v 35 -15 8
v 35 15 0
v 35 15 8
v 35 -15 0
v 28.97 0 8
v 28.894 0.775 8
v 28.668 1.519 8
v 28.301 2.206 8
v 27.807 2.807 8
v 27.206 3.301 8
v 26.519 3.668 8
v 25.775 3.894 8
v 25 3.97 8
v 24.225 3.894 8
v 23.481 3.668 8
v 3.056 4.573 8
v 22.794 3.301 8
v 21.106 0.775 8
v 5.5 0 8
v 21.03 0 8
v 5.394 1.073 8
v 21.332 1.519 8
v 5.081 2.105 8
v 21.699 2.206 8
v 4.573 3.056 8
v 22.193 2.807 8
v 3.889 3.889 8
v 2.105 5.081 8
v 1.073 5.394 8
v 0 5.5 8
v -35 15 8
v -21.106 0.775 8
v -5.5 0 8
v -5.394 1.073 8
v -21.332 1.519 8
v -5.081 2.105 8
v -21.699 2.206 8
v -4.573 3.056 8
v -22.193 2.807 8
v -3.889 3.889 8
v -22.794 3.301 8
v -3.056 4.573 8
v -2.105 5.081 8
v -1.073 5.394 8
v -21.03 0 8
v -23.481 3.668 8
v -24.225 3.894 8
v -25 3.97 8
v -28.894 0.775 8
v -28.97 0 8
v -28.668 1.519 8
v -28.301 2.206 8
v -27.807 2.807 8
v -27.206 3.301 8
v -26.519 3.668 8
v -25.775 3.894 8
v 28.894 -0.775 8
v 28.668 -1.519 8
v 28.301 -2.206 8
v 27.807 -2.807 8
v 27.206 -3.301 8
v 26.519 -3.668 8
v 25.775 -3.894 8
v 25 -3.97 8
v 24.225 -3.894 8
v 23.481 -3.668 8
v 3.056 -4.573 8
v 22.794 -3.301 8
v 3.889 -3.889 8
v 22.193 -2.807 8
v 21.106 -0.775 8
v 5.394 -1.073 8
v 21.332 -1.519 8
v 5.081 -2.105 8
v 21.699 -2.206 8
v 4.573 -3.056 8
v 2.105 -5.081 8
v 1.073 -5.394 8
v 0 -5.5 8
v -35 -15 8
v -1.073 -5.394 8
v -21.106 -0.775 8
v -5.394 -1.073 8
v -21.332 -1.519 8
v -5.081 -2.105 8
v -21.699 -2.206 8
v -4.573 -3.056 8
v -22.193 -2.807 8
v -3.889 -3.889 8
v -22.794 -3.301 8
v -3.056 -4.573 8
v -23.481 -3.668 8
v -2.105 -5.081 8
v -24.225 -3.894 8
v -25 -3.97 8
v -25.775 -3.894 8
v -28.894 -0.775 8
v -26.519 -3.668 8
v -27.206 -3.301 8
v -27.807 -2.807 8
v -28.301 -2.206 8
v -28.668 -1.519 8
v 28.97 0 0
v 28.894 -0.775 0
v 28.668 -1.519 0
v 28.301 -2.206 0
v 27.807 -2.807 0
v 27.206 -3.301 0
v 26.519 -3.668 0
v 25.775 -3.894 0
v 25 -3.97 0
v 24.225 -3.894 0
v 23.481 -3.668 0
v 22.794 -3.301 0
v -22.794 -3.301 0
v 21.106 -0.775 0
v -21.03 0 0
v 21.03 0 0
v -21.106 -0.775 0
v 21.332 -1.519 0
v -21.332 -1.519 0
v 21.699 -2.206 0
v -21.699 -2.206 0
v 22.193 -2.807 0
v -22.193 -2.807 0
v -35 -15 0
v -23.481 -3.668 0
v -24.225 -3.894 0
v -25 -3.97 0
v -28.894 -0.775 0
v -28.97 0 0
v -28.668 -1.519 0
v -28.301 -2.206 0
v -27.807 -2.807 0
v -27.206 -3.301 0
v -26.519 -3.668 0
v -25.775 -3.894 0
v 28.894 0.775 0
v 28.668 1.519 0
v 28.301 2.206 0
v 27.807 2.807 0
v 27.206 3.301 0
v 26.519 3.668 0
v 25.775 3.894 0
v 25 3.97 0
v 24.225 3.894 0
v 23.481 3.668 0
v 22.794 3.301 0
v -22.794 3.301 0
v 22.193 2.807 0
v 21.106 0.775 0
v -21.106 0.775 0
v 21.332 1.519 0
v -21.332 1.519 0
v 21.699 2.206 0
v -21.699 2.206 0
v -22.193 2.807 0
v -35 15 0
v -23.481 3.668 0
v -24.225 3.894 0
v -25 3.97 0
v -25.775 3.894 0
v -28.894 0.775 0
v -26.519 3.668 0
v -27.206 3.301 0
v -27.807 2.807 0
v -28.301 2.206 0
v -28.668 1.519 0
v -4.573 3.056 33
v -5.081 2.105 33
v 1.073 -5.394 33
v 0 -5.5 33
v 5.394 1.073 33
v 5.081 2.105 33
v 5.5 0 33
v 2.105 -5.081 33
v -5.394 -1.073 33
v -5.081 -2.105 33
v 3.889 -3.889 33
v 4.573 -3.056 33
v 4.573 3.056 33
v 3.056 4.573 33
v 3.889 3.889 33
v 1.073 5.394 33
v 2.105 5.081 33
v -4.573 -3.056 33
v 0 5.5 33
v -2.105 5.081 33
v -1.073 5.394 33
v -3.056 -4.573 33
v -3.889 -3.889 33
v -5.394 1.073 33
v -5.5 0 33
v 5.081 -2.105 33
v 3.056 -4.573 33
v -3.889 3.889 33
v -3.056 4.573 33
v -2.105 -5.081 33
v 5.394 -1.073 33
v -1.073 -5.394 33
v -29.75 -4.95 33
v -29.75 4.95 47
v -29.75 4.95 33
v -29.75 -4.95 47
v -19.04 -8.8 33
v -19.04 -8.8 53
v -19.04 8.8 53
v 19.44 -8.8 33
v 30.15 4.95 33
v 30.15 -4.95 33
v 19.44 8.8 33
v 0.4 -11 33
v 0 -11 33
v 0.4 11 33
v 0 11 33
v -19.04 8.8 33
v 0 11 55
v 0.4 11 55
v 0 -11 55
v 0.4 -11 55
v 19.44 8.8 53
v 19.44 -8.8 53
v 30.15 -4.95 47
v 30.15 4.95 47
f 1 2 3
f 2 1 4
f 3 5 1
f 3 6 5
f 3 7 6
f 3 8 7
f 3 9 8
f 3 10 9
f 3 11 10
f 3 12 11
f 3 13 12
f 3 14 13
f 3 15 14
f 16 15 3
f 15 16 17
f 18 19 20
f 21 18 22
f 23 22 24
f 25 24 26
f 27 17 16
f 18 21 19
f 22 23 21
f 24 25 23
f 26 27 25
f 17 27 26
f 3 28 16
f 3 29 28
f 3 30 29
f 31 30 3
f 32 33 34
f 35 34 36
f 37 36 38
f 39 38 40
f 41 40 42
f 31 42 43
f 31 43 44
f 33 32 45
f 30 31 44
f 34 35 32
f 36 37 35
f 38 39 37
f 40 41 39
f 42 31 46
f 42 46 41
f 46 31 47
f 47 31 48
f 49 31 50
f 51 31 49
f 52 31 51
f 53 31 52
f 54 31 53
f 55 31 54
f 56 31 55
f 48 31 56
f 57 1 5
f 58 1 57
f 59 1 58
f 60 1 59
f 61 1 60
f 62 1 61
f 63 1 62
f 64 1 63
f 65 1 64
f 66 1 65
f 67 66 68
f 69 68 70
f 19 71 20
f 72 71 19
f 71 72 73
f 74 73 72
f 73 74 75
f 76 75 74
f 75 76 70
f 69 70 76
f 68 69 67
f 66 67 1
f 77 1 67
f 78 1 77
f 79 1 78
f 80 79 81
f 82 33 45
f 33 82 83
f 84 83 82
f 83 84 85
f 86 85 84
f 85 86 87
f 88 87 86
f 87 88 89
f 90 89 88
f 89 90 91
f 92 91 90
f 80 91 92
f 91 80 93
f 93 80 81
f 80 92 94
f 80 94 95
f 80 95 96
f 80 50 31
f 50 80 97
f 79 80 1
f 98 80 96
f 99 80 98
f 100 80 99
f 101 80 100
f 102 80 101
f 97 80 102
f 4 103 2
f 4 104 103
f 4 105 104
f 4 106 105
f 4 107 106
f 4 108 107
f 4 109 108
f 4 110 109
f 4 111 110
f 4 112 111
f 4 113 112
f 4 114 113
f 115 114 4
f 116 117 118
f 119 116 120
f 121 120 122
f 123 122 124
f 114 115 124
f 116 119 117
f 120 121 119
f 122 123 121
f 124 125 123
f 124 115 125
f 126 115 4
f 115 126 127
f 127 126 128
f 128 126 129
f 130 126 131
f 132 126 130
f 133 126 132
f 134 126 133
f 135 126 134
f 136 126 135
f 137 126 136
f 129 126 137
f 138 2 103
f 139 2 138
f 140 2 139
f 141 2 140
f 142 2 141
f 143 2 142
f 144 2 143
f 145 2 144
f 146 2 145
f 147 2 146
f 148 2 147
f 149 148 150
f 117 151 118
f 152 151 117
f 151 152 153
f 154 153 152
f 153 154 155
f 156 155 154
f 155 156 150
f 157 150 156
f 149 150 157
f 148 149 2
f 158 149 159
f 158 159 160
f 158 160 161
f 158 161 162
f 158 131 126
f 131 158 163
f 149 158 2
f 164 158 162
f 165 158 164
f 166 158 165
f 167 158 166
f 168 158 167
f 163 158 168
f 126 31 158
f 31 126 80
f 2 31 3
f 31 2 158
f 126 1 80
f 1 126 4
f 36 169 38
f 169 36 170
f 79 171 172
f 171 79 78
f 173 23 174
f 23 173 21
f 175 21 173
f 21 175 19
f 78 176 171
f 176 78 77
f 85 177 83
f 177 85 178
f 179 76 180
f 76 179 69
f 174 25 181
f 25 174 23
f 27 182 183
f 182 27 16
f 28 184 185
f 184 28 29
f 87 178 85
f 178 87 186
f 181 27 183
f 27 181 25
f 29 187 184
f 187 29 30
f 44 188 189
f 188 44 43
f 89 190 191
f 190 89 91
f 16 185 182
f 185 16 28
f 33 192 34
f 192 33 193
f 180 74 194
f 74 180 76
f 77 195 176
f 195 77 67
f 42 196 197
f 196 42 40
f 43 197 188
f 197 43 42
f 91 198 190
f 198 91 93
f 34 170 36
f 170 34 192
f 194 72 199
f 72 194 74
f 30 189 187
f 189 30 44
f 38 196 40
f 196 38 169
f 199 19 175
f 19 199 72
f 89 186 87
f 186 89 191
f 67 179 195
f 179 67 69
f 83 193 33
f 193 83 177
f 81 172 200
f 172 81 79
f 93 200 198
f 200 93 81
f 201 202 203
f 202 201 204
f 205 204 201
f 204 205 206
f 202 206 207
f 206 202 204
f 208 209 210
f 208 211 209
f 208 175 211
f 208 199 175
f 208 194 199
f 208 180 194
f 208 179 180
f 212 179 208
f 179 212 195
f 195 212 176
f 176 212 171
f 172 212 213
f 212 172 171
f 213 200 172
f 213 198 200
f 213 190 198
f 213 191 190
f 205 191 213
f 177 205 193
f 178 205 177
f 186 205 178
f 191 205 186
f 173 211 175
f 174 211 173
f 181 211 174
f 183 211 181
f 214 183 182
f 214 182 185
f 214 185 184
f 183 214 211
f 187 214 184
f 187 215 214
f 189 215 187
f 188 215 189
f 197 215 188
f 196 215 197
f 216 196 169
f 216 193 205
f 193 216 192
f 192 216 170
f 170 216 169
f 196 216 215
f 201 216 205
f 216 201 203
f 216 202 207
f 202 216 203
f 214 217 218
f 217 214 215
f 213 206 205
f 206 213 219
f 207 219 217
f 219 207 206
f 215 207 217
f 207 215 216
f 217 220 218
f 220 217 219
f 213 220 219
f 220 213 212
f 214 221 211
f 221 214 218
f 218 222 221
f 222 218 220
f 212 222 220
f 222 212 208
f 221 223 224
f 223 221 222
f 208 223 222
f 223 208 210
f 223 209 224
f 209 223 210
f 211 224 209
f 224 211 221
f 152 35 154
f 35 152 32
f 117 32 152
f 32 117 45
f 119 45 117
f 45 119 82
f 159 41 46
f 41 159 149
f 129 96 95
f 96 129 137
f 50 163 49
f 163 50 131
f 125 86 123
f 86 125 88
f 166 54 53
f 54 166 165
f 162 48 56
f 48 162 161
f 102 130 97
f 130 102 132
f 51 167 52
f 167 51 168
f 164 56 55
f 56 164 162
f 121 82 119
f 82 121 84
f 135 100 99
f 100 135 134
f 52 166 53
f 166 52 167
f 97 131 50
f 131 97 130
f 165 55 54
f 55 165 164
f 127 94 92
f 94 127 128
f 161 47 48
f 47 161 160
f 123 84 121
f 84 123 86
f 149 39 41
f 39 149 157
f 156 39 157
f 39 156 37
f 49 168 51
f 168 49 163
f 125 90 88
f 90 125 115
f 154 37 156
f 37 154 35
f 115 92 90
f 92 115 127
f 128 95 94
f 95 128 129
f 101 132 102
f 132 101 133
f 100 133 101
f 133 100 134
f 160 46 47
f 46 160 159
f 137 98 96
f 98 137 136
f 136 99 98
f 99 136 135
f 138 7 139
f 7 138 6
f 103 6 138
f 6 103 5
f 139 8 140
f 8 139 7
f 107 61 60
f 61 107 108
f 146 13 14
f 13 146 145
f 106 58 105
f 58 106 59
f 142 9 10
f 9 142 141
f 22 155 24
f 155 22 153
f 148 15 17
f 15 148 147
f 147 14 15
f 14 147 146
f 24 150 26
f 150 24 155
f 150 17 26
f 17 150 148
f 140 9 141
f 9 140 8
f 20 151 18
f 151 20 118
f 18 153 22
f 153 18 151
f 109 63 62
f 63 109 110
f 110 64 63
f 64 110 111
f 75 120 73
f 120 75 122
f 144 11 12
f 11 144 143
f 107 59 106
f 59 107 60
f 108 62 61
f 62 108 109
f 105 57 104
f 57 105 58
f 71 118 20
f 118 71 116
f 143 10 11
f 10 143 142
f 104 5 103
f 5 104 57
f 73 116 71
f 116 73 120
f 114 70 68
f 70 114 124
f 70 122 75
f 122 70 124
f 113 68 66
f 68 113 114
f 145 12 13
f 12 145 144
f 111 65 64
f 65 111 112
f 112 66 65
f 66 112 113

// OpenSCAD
$fn = 32;

// ----------------------------------------------------------------------
// Boat cleat: 70 mm base, horn 44 mm up
// ----------------------------------------------------------------------

// --- parameters (mm) ---
base_l = 70;              // base length
base_w = 30;              // base width
base_t = 8;               // base thickness
horn_len = 59.5;          // horn length
horn_d = 22;              // horn diameter at the middle
horn_z = 44;              // horn axis height
end_drop = 8;             // how far the horn tips drop
post_d = 11;              // centre post diameter
holes_d = 7.94;           // fixing holes
hole_x = 25;              // fixing hole spacing

difference() {
  union() {
    translate([-35, -15, 0]) cube([base_l, base_w, base_t]);
    /* centre post, sunk 1 mm into the base */
    translate([0, 0, 7]) cylinder(h = 37, d = post_d);
    /* horn: a hull chain of boxes, full in the middle and lighter at the tips */
    hull() {
      translate([-29.75, -4.95, 33]) cube([0.4, 9.9, 14], center = false);
      translate([-19.04, -8.8, 33]) cube([0.4, 17.6, 20], center = false);
    }
    hull() {
      translate([-19.04, -8.8, 33]) cube([0.4, 17.6, 20], center = false);
      translate([0, -11, 33]) cube([0.4, 22, 22], center = false);
    }
    hull() {
      translate([0, -11, 33]) cube([0.4, 22, 22], center = false);
      translate([19.04, -8.8, 33]) cube([0.4, 17.6, 20], center = false);
    }
    hull() {
      translate([19.04, -8.8, 33]) cube([0.4, 17.6, 20], center = false);
      translate([29.75, -4.95, 33]) cube([0.4, 9.9, 14], center = false);
    }
  }
  translate([-25, 0, -2.5]) cylinder(h = base_t + 5, d = holes_d);
  translate([25, 0, -2.5]) cylinder(h = base_t + 5, d = holes_d);
}
